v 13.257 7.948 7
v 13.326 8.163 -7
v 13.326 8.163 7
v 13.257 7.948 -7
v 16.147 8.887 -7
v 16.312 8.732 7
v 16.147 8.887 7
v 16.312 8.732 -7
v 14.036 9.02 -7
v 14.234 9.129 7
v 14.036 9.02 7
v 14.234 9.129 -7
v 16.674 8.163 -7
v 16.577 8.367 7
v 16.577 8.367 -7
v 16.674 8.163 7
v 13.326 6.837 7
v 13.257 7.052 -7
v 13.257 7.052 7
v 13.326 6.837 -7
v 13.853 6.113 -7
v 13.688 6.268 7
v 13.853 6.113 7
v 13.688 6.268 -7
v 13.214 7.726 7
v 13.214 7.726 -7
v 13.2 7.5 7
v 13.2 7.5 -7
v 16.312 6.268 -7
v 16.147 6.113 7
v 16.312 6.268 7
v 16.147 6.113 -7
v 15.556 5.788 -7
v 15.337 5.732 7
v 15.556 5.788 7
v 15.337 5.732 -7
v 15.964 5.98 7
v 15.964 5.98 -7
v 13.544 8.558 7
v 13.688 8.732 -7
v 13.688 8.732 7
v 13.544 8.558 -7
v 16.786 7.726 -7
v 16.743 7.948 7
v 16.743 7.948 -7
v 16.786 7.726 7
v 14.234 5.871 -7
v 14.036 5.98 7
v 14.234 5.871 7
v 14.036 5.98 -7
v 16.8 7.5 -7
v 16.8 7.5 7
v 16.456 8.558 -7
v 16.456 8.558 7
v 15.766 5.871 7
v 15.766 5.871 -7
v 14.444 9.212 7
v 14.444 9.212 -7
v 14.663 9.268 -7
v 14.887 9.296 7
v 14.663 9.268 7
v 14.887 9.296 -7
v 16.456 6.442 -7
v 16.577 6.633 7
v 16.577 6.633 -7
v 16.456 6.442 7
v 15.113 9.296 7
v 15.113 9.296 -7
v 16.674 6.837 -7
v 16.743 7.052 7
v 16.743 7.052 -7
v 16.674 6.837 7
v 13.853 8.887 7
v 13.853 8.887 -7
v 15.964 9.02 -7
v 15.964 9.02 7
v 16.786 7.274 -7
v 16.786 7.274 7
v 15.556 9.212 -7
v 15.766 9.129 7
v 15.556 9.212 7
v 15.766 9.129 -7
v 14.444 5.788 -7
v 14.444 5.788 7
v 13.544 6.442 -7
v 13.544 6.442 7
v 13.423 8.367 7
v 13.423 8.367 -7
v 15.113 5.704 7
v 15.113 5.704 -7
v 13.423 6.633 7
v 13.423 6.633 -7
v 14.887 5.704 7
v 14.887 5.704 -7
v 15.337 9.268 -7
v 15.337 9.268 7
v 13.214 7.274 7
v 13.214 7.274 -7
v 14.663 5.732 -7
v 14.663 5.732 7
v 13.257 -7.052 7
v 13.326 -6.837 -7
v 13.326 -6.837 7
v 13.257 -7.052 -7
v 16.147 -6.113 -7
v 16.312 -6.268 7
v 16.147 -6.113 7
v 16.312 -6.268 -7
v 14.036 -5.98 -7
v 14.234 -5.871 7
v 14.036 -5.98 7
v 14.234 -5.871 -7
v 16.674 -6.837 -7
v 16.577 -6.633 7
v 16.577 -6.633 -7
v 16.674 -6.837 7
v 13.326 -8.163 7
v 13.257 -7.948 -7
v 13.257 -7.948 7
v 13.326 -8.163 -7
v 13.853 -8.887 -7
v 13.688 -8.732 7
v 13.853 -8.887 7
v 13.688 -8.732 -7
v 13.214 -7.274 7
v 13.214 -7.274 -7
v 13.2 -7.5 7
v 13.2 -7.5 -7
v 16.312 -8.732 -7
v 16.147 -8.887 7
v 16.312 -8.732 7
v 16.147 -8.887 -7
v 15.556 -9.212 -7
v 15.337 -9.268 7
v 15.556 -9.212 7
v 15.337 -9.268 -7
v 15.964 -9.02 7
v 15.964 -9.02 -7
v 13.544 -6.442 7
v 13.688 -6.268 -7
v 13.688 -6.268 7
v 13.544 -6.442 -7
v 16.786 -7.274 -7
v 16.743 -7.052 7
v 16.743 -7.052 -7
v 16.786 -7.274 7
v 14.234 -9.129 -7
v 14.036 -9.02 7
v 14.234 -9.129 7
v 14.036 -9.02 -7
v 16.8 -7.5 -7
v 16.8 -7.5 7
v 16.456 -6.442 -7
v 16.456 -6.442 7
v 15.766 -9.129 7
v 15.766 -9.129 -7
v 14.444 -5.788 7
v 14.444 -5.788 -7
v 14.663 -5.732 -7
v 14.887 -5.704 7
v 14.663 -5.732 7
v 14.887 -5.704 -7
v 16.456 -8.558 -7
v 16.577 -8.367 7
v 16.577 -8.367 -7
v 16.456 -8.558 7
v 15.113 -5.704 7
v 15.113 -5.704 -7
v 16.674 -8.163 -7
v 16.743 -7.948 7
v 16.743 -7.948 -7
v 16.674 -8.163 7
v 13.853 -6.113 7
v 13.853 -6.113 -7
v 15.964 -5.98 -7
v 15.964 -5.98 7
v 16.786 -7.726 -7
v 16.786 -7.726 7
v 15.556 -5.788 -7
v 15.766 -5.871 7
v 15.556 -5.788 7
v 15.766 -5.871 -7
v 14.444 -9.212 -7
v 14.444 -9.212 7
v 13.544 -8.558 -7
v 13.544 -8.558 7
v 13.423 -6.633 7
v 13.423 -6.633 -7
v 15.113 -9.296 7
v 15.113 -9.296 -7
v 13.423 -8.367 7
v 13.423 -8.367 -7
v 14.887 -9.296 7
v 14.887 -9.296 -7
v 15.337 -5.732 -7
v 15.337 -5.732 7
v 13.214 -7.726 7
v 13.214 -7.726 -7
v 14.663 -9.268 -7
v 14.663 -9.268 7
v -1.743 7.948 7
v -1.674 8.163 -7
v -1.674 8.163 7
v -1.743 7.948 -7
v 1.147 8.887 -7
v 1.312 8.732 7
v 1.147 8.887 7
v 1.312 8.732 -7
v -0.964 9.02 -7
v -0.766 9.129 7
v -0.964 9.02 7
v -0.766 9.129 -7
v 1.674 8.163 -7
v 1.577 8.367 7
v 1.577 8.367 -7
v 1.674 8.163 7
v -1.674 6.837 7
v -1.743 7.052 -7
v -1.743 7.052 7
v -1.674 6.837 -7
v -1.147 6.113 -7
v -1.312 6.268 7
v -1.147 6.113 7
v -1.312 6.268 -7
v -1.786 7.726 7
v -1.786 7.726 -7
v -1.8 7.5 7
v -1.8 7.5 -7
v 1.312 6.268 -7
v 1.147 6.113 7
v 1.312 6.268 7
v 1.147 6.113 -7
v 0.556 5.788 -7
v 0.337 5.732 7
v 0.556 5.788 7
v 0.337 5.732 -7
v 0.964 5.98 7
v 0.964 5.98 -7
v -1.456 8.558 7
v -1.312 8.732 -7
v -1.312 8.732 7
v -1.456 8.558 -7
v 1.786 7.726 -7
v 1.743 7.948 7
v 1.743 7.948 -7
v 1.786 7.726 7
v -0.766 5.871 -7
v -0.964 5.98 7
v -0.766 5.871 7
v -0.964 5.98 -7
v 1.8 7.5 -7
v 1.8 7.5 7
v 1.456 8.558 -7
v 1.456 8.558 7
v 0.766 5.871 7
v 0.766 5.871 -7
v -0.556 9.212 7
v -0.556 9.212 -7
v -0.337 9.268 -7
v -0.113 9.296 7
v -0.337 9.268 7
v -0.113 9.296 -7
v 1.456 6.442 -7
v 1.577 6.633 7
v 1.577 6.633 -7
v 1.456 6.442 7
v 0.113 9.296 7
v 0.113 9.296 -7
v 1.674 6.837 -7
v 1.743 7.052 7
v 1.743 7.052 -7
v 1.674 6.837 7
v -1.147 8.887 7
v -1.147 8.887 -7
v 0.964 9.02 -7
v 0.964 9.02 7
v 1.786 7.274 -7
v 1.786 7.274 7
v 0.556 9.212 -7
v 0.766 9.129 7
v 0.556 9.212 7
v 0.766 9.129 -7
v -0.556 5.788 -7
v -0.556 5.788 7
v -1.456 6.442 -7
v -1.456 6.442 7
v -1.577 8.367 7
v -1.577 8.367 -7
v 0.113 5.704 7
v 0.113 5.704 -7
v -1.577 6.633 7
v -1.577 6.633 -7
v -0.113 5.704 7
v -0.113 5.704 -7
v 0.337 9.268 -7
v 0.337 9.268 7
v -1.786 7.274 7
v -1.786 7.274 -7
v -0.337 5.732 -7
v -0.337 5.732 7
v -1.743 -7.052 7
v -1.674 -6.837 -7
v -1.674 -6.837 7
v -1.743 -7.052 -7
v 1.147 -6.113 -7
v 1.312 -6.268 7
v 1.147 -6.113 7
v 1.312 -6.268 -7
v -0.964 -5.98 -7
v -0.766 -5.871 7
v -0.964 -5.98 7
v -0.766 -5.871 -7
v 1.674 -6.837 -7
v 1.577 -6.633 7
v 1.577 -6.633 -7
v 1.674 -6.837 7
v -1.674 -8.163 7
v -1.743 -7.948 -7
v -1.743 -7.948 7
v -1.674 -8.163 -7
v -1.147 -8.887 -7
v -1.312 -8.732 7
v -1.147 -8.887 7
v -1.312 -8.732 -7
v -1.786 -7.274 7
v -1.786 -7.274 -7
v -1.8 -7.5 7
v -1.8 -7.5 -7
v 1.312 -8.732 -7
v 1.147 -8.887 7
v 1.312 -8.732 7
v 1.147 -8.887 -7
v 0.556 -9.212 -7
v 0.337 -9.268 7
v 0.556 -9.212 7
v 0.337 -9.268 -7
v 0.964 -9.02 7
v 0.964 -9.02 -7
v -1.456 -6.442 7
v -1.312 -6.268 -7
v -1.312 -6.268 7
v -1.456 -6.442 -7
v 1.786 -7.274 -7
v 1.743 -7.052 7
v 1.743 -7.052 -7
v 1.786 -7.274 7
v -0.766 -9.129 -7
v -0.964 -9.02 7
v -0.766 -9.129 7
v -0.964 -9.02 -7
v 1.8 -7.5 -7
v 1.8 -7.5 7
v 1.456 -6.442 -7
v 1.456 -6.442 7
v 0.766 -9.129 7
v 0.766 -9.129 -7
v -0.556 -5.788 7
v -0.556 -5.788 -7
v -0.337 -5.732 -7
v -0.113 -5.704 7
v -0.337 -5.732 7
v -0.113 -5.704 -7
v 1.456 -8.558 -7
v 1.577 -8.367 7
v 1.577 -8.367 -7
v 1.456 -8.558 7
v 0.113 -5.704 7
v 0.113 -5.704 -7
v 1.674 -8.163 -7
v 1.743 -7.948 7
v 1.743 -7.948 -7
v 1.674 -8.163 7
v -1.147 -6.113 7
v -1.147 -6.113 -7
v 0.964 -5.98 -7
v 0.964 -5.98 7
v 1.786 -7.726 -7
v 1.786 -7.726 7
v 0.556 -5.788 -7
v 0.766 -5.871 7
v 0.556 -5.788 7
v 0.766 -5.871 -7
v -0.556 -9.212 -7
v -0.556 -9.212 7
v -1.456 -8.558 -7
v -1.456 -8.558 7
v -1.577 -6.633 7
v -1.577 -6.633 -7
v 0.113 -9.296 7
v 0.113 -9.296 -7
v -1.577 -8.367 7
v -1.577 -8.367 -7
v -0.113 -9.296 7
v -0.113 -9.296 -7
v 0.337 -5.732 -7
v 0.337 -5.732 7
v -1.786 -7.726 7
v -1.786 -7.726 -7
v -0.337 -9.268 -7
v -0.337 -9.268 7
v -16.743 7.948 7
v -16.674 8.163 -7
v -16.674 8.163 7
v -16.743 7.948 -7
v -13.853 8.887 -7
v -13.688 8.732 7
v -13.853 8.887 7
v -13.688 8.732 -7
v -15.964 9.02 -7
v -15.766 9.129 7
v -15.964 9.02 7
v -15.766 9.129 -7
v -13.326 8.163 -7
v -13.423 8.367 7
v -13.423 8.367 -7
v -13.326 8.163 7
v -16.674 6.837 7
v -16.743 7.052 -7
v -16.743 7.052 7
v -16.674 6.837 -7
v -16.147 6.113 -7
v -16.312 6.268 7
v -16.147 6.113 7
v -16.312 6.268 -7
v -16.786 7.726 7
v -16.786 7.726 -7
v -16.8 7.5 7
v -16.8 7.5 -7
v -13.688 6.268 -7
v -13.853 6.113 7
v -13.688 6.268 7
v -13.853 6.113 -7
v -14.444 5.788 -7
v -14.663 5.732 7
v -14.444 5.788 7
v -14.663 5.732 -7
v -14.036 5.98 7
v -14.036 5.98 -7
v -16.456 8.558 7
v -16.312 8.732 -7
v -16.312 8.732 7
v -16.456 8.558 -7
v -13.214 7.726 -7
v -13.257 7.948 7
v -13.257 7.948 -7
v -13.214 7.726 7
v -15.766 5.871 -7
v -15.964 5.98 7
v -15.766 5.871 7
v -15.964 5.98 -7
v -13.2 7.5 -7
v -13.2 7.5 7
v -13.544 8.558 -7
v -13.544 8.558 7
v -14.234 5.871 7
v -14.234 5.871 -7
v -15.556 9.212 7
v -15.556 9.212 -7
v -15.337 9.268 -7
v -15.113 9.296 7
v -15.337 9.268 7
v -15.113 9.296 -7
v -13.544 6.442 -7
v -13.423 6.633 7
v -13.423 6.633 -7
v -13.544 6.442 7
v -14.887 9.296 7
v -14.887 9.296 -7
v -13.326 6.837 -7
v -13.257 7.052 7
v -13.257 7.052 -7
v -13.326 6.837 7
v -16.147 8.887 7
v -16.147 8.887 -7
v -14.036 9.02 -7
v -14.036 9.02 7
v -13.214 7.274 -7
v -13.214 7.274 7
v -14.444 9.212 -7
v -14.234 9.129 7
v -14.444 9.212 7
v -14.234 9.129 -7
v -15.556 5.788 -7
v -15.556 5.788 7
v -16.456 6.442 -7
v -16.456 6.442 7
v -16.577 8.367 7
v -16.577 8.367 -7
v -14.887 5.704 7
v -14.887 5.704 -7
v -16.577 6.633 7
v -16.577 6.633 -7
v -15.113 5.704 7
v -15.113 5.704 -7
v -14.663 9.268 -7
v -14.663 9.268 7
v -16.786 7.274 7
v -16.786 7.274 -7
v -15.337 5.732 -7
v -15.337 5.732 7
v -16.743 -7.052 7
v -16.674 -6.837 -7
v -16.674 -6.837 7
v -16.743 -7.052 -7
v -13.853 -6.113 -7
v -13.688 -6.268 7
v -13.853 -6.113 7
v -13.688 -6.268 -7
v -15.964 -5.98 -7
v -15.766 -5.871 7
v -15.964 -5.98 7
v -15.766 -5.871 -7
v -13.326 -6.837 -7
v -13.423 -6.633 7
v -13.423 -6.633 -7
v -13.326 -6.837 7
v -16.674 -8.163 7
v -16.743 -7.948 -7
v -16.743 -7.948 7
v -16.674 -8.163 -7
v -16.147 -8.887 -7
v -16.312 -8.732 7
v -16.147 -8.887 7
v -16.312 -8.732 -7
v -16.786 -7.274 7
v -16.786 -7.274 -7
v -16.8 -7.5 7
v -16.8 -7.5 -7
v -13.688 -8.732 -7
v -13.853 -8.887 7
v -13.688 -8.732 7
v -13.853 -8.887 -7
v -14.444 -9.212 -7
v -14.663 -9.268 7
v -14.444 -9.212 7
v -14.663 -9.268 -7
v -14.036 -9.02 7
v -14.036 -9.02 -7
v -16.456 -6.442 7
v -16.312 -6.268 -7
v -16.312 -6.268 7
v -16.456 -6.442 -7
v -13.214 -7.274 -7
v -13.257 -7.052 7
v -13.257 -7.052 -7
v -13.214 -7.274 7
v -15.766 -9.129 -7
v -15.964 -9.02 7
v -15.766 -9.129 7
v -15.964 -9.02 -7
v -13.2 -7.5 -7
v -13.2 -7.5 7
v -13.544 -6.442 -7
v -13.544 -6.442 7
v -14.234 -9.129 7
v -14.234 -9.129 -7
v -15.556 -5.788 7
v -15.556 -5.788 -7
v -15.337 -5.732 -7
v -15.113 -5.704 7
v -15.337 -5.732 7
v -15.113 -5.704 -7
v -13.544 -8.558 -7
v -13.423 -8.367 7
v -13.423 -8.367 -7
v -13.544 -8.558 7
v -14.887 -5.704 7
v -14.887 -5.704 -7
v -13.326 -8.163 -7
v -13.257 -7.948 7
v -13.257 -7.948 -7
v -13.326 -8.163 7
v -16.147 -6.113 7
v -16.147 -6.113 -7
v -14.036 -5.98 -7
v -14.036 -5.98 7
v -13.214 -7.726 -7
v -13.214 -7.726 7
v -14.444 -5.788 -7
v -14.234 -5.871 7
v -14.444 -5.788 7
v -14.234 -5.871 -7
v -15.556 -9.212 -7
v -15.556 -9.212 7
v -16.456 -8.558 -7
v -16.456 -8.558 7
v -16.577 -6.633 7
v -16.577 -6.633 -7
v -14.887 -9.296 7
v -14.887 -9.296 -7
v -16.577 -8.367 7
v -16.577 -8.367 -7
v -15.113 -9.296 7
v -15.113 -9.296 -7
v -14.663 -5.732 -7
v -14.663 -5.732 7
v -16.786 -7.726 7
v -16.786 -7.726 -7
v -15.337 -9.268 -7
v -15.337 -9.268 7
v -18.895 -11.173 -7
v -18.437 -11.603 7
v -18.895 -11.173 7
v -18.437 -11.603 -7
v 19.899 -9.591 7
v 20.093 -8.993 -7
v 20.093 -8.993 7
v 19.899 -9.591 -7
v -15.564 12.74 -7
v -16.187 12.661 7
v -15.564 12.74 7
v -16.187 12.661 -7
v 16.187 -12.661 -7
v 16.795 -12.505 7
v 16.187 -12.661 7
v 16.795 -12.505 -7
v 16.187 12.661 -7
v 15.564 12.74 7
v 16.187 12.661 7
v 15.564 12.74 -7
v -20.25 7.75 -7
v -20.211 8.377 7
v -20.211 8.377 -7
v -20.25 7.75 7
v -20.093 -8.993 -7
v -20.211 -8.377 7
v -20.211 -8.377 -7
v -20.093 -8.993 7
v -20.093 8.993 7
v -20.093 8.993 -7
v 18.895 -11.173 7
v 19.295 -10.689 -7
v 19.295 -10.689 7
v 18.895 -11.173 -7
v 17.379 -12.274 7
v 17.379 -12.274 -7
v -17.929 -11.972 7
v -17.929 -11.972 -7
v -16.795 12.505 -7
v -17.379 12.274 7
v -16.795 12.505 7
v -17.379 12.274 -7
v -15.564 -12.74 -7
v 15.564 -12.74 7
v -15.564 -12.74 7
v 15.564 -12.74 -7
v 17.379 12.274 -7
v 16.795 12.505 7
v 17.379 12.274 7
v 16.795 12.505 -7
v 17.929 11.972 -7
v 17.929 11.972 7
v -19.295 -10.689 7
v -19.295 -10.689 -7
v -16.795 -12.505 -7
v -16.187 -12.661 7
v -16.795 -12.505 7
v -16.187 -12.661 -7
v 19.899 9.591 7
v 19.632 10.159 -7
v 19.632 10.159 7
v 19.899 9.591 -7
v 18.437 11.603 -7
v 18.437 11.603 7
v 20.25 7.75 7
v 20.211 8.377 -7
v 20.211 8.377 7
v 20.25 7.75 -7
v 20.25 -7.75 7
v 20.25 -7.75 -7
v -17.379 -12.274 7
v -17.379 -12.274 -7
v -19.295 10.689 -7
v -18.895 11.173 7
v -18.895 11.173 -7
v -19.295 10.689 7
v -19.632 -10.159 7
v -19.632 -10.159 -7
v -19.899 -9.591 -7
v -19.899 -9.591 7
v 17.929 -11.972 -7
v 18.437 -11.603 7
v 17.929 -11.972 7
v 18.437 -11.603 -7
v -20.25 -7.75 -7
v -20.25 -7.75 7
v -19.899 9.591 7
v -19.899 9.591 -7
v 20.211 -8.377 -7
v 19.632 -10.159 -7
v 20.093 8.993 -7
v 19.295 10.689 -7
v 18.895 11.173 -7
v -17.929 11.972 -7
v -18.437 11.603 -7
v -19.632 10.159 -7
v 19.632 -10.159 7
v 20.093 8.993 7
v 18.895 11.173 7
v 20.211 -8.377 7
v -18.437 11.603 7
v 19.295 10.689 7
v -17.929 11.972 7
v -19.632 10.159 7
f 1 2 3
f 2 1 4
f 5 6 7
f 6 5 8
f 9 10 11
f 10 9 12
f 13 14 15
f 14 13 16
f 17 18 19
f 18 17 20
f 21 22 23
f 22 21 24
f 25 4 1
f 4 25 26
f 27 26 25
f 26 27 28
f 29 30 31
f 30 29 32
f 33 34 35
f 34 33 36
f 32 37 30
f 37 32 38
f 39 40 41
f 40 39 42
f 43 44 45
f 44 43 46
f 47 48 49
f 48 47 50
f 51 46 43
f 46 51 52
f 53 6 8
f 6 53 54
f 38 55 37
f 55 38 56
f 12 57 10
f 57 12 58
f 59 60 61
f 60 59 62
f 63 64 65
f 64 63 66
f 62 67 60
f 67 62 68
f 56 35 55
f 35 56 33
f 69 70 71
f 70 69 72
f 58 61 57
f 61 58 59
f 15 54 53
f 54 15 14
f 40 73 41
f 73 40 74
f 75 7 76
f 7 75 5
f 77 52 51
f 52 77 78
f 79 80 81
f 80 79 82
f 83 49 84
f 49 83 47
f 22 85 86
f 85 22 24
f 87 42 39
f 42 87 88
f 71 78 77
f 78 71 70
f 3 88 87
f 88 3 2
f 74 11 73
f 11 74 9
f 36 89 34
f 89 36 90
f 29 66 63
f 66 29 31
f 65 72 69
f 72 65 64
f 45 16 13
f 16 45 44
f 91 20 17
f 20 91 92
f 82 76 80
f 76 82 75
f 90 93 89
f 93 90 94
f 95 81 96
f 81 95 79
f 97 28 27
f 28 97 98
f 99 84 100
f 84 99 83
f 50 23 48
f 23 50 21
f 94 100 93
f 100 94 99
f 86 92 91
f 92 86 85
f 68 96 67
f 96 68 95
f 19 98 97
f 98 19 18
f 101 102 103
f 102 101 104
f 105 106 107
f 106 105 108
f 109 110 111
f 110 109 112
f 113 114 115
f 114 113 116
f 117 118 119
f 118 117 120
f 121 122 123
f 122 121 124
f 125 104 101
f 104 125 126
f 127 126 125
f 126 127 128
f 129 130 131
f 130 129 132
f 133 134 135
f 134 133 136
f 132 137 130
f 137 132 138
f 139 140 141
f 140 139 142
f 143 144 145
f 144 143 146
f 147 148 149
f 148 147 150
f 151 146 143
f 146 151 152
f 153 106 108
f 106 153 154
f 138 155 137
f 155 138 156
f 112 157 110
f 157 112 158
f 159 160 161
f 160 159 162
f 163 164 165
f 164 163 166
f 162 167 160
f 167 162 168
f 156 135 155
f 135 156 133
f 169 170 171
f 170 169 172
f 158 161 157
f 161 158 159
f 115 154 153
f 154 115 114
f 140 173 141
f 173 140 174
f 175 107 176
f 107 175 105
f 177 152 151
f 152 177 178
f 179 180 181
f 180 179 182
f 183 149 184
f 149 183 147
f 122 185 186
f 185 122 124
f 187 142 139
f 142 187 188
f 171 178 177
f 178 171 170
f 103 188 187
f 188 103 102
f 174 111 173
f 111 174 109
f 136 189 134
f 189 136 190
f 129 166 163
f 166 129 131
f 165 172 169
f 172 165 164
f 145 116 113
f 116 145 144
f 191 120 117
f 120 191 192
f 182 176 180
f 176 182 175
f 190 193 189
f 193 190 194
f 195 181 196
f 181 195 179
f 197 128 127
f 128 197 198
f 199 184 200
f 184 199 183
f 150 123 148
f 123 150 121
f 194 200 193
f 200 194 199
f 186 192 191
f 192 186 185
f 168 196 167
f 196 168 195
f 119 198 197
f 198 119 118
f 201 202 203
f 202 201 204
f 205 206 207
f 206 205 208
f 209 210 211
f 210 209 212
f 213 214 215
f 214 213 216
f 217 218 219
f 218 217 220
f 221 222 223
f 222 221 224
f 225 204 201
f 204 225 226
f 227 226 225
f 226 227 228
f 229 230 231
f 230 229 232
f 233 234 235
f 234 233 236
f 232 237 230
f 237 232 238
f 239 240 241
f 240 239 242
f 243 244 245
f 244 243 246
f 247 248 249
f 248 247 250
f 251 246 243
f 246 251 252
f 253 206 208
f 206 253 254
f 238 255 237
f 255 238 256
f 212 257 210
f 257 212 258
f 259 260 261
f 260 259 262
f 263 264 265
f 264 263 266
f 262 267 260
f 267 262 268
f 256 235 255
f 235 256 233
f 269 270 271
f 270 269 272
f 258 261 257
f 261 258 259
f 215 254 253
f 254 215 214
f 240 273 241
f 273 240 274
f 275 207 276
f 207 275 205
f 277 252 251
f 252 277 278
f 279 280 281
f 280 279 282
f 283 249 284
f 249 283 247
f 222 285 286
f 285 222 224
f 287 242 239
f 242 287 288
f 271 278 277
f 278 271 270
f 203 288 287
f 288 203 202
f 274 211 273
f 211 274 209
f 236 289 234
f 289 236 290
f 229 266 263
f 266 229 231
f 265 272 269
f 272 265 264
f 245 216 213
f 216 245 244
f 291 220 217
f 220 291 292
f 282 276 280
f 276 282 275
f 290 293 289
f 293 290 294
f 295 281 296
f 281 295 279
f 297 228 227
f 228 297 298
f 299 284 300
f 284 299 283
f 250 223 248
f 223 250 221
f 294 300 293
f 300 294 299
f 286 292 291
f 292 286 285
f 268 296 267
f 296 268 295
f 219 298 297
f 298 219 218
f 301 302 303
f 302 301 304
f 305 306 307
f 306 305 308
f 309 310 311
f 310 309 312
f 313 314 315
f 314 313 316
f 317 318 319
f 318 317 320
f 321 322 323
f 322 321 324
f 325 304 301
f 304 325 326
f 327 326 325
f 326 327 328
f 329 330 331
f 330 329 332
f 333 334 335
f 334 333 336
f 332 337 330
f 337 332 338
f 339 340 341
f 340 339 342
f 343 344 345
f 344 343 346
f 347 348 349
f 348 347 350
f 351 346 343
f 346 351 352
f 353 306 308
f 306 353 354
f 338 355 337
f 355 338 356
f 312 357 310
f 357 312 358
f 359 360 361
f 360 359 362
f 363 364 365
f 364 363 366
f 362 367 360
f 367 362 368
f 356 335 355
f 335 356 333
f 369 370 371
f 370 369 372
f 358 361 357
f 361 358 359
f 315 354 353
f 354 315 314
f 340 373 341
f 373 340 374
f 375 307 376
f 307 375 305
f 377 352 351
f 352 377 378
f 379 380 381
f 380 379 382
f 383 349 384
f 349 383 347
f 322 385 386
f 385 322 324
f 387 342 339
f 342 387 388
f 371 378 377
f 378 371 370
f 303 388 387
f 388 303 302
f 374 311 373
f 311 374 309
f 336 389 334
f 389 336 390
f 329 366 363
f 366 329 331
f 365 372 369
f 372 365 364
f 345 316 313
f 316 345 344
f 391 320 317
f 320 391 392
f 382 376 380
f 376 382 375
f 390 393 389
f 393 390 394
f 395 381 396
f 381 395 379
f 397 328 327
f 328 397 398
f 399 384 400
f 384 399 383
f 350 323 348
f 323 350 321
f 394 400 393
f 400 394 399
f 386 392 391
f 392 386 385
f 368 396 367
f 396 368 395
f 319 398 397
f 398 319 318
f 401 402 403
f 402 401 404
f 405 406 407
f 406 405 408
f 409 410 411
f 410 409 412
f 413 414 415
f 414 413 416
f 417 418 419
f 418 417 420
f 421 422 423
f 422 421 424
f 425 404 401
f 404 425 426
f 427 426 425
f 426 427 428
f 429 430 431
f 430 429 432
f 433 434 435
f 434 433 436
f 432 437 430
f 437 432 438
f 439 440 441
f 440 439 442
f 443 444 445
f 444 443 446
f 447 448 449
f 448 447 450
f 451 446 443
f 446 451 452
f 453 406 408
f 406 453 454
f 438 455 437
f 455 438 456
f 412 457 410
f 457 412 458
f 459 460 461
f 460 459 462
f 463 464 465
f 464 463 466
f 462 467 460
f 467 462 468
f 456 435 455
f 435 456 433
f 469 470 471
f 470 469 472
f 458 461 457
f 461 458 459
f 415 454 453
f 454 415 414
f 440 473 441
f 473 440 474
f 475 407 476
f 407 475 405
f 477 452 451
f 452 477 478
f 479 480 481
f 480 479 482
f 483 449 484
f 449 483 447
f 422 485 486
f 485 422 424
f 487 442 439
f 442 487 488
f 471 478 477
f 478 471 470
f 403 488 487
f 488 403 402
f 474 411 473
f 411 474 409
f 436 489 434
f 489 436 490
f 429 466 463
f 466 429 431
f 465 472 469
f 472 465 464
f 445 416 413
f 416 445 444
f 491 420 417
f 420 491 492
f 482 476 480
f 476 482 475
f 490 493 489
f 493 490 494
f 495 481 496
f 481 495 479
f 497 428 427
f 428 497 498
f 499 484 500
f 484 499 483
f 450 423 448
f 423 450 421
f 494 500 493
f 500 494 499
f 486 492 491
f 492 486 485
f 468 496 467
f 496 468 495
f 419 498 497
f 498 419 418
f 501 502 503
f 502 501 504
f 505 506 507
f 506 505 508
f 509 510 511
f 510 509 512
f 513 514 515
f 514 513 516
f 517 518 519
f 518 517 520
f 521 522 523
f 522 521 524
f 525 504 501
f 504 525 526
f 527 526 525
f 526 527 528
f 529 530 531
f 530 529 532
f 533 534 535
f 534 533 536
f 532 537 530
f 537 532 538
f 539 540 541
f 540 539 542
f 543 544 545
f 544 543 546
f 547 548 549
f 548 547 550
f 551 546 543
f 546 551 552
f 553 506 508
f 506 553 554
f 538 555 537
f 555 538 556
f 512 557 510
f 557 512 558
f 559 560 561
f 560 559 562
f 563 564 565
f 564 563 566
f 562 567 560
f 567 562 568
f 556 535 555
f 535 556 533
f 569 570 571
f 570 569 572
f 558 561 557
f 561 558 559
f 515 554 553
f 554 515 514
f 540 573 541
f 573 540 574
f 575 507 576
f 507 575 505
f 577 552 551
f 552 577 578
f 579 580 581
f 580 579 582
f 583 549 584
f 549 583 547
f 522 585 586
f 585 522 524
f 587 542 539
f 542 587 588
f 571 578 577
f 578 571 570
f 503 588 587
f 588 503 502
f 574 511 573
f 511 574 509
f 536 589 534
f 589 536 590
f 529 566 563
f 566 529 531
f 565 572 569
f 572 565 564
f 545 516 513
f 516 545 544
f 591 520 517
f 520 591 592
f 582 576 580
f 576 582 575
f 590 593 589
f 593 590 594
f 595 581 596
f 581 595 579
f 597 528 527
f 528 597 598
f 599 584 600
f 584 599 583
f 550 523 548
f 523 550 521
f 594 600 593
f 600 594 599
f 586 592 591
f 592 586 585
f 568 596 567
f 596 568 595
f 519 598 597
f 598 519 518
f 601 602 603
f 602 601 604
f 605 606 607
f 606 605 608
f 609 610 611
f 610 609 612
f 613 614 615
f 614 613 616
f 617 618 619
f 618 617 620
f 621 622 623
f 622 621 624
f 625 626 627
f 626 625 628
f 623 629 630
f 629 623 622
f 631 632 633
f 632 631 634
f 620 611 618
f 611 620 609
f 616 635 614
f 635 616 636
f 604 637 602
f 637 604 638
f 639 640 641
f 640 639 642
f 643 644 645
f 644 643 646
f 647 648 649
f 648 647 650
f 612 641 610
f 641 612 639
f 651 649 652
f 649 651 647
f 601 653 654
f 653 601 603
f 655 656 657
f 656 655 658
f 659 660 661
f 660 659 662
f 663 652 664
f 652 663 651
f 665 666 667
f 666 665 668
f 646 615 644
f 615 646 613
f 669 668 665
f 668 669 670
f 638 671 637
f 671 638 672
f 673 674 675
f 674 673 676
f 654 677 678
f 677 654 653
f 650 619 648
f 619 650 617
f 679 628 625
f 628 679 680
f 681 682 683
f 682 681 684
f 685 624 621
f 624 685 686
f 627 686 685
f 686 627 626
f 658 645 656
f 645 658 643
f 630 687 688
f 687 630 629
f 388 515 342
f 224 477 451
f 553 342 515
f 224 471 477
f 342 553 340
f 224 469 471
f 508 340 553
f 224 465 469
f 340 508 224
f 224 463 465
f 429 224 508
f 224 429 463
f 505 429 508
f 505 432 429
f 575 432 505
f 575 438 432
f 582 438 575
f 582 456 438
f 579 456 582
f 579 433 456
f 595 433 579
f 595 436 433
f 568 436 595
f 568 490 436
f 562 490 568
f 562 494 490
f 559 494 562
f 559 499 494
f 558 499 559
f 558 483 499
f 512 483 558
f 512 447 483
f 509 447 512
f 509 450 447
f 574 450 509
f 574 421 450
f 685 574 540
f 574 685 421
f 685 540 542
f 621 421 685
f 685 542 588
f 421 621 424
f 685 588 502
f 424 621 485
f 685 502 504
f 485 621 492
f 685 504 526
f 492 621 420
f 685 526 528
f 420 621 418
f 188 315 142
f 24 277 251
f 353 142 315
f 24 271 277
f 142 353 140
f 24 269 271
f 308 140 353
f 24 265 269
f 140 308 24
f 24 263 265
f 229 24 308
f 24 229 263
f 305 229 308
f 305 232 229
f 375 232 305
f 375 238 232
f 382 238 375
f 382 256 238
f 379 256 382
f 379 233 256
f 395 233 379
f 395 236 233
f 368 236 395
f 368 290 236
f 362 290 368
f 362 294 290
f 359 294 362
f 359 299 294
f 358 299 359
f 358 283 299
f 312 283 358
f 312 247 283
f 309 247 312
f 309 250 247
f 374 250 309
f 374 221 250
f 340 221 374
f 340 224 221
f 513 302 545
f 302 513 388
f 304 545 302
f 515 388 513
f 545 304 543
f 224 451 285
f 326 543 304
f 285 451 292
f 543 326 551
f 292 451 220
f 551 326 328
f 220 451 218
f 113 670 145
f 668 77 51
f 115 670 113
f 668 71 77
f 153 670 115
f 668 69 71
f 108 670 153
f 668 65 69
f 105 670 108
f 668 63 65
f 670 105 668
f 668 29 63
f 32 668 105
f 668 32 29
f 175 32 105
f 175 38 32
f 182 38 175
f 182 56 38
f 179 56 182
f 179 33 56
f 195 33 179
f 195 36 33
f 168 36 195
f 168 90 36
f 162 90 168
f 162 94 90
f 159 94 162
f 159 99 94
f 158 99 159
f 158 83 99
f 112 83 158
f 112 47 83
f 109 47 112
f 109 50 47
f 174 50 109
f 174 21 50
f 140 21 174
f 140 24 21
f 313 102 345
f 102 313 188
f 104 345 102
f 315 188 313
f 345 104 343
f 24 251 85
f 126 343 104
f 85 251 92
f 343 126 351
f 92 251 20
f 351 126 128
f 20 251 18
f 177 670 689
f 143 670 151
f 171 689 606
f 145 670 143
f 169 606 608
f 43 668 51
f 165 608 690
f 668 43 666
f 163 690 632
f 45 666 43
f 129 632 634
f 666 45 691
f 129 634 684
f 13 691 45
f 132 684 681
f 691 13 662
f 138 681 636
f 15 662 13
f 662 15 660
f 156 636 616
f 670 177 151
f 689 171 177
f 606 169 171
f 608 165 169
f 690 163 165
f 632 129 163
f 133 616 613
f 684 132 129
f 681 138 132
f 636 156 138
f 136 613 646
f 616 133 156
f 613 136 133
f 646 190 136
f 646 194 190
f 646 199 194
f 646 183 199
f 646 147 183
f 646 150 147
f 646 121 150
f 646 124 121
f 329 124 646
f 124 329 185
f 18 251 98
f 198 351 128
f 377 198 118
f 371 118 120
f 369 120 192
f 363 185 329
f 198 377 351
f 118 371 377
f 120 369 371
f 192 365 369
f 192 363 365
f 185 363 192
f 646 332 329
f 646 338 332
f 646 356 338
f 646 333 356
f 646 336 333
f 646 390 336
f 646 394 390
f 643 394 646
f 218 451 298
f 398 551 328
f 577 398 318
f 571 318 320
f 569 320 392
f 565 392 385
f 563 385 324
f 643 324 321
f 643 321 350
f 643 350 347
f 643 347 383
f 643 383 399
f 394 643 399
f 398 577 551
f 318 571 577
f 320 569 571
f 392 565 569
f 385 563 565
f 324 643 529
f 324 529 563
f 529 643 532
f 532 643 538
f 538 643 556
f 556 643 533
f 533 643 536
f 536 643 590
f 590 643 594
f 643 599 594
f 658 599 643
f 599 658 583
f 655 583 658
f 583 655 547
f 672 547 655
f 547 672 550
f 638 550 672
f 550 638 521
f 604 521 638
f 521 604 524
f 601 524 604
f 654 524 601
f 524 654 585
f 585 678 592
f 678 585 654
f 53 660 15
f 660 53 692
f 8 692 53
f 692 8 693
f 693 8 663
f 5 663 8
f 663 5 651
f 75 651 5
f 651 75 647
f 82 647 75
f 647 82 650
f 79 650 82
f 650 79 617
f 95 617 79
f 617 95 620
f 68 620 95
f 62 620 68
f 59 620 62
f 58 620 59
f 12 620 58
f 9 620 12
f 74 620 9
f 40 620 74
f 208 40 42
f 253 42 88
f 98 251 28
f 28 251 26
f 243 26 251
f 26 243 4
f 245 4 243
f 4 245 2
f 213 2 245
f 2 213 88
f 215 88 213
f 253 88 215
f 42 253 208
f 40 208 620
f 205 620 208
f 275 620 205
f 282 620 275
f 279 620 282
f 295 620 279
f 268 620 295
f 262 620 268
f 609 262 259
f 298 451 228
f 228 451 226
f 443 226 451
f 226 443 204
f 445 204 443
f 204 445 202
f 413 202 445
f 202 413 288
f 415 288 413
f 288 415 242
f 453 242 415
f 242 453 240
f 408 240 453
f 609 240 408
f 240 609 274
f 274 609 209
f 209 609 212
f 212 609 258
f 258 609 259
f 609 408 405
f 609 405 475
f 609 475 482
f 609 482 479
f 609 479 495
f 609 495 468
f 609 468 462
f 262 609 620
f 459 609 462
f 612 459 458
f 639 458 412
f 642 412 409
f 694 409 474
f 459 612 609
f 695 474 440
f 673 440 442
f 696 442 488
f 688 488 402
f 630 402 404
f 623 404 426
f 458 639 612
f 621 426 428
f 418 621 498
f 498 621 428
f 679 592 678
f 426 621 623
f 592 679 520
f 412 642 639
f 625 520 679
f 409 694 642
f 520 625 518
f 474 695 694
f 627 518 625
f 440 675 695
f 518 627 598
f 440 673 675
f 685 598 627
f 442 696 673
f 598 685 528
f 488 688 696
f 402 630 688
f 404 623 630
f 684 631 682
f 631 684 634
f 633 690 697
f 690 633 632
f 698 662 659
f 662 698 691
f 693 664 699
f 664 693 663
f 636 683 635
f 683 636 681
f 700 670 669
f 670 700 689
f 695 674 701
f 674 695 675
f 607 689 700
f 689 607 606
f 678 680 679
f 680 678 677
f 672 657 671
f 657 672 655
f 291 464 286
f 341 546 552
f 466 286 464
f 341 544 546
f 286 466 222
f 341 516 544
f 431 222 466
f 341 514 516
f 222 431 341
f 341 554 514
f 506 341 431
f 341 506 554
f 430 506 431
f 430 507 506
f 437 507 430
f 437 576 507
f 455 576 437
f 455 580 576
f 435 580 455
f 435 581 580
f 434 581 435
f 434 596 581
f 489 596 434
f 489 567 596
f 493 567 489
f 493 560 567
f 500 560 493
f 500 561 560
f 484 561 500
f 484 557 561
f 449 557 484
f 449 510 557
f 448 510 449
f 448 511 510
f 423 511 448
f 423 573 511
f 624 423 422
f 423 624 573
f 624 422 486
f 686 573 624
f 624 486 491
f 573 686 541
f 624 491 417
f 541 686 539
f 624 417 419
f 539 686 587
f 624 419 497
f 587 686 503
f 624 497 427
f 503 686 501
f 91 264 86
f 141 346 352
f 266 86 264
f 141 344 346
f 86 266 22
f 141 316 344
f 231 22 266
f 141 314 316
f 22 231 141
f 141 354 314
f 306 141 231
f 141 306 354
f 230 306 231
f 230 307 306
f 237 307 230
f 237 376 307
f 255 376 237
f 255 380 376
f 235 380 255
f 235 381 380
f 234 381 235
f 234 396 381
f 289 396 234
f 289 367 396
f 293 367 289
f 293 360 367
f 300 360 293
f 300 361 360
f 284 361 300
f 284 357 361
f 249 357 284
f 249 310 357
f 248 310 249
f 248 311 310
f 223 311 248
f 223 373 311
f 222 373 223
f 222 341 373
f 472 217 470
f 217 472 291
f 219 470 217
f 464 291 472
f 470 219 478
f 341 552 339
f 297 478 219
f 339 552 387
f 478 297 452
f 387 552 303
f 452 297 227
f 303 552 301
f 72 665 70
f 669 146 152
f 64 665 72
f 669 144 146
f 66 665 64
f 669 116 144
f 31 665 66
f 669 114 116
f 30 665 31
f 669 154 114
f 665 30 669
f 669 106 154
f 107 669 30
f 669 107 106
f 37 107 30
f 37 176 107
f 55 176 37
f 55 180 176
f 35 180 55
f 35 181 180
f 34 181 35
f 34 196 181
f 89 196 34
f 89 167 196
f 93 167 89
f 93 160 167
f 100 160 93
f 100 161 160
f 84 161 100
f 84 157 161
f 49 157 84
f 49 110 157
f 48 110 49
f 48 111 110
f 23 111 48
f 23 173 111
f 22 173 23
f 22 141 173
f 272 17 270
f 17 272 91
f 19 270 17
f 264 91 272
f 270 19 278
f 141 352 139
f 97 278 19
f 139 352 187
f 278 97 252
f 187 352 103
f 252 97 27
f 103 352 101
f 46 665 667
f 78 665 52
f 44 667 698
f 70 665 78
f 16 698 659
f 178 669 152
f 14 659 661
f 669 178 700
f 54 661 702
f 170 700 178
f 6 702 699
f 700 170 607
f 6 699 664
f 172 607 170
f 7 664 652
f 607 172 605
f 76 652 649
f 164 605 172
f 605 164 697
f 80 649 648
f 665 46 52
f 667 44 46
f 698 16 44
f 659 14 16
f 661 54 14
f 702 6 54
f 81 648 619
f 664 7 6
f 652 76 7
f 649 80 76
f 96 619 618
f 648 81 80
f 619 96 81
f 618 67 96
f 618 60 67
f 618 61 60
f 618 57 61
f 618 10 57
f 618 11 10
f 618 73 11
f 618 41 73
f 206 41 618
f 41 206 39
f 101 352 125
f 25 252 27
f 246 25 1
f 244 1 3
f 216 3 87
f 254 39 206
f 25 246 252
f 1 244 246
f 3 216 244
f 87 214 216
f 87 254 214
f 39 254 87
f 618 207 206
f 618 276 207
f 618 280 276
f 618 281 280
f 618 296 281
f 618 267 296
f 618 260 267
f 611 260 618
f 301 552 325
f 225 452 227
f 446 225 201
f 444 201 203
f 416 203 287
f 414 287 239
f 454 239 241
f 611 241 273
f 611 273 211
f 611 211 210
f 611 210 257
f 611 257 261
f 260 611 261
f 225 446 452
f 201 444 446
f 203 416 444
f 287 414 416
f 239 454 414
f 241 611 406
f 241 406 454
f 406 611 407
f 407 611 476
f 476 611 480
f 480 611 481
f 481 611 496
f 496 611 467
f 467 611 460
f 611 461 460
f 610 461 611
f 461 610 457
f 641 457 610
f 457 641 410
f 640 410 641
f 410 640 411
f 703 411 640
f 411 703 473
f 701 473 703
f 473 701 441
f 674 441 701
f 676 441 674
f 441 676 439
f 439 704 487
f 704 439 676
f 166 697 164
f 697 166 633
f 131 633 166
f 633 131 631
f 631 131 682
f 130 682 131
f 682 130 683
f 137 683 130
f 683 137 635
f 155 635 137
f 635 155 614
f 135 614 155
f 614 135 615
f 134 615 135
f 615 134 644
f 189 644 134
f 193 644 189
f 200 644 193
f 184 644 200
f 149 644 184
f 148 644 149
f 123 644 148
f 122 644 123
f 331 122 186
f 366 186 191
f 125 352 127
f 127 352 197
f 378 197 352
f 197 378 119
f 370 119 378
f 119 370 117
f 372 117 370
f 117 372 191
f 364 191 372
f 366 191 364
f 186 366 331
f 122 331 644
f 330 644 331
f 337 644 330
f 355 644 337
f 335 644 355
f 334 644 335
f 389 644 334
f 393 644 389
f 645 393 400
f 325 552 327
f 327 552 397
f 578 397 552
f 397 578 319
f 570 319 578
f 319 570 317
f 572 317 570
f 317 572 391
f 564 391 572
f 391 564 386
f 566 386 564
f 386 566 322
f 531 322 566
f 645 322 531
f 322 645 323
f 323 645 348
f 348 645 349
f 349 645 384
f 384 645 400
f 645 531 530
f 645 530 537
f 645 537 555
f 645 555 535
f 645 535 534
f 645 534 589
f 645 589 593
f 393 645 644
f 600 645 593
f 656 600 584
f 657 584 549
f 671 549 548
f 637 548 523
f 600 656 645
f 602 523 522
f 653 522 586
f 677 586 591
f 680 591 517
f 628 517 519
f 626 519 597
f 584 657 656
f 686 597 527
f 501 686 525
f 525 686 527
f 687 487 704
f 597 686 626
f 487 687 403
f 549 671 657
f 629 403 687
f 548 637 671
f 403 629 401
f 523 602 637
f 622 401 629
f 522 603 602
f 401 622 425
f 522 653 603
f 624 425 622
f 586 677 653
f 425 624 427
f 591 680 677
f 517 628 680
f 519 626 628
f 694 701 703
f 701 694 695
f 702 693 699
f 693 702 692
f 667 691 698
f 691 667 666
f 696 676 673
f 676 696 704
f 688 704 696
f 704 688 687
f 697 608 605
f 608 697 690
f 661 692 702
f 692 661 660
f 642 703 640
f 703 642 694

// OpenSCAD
$fn = 50;


difference() {
	union() {
		translate(v = [0, 0, -7.0000000000]) {
			hull() {
				translate(v = [-15.2500000000, 7.7500000000, 0]) {
					cylinder(h = 14, r = 5);
				}
				translate(v = [15.2500000000, 7.7500000000, 0]) {
					cylinder(h = 14, r = 5);
				}
				translate(v = [-15.2500000000, -7.7500000000, 0]) {
					cylinder(h = 14, r = 5);
				}
				translate(v = [15.2500000000, -7.7500000000, 0]) {
					cylinder(h = 14, r = 5);
				}
			}
		}
	}
	union() {
		translate(v = [15, 7.5000000000, 0]) {
			rotate(a = [0, 0, 0]) {
				difference() {
					union() {
						translate(v = [0, 0, -50.0000000000]) {
							cylinder(h = 100, r = 1.8000000000);
						}
					}
					union();
				}
			}
		}
		translate(v = [15, -7.5000000000, 0]) {
			rotate(a = [0, 0, 0]) {
				difference() {
					union() {
						translate(v = [0, 0, -50.0000000000]) {
							cylinder(h = 100, r = 1.8000000000);
						}
					}
					union();
				}
			}
		}
		translate(v = [0, 7.5000000000, 0]) {
			rotate(a = [0, 0, 0]) {
				difference() {
					union() {
						translate(v = [0, 0, -50.0000000000]) {
							cylinder(h = 100, r = 1.8000000000);
						}
					}
					union();
				}
			}
		}
		translate(v = [0, -7.5000000000, 0]) {
			rotate(a = [0, 0, 0]) {
				difference() {
					union() {
						translate(v = [0, 0, -50.0000000000]) {
							cylinder(h = 100, r = 1.8000000000);
						}
					}
					union();
				}
			}
		}
		translate(v = [-15, 7.5000000000, 0]) {
			rotate(a = [0, 0, 0]) {
				difference() {
					union() {
						translate(v = [0, 0, -50.0000000000]) {
							cylinder(h = 100, r = 1.8000000000);
						}
					}
					union();
				}
			}
		}
		translate(v = [-15, -7.5000000000, 0]) {
			rotate(a = [0, 0, 0]) {
				difference() {
					union() {
						translate(v = [0, 0, -50.0000000000]) {
							cylinder(h = 100, r = 1.8000000000);
						}
					}
					union();
				}
			}
		}
	}
}
